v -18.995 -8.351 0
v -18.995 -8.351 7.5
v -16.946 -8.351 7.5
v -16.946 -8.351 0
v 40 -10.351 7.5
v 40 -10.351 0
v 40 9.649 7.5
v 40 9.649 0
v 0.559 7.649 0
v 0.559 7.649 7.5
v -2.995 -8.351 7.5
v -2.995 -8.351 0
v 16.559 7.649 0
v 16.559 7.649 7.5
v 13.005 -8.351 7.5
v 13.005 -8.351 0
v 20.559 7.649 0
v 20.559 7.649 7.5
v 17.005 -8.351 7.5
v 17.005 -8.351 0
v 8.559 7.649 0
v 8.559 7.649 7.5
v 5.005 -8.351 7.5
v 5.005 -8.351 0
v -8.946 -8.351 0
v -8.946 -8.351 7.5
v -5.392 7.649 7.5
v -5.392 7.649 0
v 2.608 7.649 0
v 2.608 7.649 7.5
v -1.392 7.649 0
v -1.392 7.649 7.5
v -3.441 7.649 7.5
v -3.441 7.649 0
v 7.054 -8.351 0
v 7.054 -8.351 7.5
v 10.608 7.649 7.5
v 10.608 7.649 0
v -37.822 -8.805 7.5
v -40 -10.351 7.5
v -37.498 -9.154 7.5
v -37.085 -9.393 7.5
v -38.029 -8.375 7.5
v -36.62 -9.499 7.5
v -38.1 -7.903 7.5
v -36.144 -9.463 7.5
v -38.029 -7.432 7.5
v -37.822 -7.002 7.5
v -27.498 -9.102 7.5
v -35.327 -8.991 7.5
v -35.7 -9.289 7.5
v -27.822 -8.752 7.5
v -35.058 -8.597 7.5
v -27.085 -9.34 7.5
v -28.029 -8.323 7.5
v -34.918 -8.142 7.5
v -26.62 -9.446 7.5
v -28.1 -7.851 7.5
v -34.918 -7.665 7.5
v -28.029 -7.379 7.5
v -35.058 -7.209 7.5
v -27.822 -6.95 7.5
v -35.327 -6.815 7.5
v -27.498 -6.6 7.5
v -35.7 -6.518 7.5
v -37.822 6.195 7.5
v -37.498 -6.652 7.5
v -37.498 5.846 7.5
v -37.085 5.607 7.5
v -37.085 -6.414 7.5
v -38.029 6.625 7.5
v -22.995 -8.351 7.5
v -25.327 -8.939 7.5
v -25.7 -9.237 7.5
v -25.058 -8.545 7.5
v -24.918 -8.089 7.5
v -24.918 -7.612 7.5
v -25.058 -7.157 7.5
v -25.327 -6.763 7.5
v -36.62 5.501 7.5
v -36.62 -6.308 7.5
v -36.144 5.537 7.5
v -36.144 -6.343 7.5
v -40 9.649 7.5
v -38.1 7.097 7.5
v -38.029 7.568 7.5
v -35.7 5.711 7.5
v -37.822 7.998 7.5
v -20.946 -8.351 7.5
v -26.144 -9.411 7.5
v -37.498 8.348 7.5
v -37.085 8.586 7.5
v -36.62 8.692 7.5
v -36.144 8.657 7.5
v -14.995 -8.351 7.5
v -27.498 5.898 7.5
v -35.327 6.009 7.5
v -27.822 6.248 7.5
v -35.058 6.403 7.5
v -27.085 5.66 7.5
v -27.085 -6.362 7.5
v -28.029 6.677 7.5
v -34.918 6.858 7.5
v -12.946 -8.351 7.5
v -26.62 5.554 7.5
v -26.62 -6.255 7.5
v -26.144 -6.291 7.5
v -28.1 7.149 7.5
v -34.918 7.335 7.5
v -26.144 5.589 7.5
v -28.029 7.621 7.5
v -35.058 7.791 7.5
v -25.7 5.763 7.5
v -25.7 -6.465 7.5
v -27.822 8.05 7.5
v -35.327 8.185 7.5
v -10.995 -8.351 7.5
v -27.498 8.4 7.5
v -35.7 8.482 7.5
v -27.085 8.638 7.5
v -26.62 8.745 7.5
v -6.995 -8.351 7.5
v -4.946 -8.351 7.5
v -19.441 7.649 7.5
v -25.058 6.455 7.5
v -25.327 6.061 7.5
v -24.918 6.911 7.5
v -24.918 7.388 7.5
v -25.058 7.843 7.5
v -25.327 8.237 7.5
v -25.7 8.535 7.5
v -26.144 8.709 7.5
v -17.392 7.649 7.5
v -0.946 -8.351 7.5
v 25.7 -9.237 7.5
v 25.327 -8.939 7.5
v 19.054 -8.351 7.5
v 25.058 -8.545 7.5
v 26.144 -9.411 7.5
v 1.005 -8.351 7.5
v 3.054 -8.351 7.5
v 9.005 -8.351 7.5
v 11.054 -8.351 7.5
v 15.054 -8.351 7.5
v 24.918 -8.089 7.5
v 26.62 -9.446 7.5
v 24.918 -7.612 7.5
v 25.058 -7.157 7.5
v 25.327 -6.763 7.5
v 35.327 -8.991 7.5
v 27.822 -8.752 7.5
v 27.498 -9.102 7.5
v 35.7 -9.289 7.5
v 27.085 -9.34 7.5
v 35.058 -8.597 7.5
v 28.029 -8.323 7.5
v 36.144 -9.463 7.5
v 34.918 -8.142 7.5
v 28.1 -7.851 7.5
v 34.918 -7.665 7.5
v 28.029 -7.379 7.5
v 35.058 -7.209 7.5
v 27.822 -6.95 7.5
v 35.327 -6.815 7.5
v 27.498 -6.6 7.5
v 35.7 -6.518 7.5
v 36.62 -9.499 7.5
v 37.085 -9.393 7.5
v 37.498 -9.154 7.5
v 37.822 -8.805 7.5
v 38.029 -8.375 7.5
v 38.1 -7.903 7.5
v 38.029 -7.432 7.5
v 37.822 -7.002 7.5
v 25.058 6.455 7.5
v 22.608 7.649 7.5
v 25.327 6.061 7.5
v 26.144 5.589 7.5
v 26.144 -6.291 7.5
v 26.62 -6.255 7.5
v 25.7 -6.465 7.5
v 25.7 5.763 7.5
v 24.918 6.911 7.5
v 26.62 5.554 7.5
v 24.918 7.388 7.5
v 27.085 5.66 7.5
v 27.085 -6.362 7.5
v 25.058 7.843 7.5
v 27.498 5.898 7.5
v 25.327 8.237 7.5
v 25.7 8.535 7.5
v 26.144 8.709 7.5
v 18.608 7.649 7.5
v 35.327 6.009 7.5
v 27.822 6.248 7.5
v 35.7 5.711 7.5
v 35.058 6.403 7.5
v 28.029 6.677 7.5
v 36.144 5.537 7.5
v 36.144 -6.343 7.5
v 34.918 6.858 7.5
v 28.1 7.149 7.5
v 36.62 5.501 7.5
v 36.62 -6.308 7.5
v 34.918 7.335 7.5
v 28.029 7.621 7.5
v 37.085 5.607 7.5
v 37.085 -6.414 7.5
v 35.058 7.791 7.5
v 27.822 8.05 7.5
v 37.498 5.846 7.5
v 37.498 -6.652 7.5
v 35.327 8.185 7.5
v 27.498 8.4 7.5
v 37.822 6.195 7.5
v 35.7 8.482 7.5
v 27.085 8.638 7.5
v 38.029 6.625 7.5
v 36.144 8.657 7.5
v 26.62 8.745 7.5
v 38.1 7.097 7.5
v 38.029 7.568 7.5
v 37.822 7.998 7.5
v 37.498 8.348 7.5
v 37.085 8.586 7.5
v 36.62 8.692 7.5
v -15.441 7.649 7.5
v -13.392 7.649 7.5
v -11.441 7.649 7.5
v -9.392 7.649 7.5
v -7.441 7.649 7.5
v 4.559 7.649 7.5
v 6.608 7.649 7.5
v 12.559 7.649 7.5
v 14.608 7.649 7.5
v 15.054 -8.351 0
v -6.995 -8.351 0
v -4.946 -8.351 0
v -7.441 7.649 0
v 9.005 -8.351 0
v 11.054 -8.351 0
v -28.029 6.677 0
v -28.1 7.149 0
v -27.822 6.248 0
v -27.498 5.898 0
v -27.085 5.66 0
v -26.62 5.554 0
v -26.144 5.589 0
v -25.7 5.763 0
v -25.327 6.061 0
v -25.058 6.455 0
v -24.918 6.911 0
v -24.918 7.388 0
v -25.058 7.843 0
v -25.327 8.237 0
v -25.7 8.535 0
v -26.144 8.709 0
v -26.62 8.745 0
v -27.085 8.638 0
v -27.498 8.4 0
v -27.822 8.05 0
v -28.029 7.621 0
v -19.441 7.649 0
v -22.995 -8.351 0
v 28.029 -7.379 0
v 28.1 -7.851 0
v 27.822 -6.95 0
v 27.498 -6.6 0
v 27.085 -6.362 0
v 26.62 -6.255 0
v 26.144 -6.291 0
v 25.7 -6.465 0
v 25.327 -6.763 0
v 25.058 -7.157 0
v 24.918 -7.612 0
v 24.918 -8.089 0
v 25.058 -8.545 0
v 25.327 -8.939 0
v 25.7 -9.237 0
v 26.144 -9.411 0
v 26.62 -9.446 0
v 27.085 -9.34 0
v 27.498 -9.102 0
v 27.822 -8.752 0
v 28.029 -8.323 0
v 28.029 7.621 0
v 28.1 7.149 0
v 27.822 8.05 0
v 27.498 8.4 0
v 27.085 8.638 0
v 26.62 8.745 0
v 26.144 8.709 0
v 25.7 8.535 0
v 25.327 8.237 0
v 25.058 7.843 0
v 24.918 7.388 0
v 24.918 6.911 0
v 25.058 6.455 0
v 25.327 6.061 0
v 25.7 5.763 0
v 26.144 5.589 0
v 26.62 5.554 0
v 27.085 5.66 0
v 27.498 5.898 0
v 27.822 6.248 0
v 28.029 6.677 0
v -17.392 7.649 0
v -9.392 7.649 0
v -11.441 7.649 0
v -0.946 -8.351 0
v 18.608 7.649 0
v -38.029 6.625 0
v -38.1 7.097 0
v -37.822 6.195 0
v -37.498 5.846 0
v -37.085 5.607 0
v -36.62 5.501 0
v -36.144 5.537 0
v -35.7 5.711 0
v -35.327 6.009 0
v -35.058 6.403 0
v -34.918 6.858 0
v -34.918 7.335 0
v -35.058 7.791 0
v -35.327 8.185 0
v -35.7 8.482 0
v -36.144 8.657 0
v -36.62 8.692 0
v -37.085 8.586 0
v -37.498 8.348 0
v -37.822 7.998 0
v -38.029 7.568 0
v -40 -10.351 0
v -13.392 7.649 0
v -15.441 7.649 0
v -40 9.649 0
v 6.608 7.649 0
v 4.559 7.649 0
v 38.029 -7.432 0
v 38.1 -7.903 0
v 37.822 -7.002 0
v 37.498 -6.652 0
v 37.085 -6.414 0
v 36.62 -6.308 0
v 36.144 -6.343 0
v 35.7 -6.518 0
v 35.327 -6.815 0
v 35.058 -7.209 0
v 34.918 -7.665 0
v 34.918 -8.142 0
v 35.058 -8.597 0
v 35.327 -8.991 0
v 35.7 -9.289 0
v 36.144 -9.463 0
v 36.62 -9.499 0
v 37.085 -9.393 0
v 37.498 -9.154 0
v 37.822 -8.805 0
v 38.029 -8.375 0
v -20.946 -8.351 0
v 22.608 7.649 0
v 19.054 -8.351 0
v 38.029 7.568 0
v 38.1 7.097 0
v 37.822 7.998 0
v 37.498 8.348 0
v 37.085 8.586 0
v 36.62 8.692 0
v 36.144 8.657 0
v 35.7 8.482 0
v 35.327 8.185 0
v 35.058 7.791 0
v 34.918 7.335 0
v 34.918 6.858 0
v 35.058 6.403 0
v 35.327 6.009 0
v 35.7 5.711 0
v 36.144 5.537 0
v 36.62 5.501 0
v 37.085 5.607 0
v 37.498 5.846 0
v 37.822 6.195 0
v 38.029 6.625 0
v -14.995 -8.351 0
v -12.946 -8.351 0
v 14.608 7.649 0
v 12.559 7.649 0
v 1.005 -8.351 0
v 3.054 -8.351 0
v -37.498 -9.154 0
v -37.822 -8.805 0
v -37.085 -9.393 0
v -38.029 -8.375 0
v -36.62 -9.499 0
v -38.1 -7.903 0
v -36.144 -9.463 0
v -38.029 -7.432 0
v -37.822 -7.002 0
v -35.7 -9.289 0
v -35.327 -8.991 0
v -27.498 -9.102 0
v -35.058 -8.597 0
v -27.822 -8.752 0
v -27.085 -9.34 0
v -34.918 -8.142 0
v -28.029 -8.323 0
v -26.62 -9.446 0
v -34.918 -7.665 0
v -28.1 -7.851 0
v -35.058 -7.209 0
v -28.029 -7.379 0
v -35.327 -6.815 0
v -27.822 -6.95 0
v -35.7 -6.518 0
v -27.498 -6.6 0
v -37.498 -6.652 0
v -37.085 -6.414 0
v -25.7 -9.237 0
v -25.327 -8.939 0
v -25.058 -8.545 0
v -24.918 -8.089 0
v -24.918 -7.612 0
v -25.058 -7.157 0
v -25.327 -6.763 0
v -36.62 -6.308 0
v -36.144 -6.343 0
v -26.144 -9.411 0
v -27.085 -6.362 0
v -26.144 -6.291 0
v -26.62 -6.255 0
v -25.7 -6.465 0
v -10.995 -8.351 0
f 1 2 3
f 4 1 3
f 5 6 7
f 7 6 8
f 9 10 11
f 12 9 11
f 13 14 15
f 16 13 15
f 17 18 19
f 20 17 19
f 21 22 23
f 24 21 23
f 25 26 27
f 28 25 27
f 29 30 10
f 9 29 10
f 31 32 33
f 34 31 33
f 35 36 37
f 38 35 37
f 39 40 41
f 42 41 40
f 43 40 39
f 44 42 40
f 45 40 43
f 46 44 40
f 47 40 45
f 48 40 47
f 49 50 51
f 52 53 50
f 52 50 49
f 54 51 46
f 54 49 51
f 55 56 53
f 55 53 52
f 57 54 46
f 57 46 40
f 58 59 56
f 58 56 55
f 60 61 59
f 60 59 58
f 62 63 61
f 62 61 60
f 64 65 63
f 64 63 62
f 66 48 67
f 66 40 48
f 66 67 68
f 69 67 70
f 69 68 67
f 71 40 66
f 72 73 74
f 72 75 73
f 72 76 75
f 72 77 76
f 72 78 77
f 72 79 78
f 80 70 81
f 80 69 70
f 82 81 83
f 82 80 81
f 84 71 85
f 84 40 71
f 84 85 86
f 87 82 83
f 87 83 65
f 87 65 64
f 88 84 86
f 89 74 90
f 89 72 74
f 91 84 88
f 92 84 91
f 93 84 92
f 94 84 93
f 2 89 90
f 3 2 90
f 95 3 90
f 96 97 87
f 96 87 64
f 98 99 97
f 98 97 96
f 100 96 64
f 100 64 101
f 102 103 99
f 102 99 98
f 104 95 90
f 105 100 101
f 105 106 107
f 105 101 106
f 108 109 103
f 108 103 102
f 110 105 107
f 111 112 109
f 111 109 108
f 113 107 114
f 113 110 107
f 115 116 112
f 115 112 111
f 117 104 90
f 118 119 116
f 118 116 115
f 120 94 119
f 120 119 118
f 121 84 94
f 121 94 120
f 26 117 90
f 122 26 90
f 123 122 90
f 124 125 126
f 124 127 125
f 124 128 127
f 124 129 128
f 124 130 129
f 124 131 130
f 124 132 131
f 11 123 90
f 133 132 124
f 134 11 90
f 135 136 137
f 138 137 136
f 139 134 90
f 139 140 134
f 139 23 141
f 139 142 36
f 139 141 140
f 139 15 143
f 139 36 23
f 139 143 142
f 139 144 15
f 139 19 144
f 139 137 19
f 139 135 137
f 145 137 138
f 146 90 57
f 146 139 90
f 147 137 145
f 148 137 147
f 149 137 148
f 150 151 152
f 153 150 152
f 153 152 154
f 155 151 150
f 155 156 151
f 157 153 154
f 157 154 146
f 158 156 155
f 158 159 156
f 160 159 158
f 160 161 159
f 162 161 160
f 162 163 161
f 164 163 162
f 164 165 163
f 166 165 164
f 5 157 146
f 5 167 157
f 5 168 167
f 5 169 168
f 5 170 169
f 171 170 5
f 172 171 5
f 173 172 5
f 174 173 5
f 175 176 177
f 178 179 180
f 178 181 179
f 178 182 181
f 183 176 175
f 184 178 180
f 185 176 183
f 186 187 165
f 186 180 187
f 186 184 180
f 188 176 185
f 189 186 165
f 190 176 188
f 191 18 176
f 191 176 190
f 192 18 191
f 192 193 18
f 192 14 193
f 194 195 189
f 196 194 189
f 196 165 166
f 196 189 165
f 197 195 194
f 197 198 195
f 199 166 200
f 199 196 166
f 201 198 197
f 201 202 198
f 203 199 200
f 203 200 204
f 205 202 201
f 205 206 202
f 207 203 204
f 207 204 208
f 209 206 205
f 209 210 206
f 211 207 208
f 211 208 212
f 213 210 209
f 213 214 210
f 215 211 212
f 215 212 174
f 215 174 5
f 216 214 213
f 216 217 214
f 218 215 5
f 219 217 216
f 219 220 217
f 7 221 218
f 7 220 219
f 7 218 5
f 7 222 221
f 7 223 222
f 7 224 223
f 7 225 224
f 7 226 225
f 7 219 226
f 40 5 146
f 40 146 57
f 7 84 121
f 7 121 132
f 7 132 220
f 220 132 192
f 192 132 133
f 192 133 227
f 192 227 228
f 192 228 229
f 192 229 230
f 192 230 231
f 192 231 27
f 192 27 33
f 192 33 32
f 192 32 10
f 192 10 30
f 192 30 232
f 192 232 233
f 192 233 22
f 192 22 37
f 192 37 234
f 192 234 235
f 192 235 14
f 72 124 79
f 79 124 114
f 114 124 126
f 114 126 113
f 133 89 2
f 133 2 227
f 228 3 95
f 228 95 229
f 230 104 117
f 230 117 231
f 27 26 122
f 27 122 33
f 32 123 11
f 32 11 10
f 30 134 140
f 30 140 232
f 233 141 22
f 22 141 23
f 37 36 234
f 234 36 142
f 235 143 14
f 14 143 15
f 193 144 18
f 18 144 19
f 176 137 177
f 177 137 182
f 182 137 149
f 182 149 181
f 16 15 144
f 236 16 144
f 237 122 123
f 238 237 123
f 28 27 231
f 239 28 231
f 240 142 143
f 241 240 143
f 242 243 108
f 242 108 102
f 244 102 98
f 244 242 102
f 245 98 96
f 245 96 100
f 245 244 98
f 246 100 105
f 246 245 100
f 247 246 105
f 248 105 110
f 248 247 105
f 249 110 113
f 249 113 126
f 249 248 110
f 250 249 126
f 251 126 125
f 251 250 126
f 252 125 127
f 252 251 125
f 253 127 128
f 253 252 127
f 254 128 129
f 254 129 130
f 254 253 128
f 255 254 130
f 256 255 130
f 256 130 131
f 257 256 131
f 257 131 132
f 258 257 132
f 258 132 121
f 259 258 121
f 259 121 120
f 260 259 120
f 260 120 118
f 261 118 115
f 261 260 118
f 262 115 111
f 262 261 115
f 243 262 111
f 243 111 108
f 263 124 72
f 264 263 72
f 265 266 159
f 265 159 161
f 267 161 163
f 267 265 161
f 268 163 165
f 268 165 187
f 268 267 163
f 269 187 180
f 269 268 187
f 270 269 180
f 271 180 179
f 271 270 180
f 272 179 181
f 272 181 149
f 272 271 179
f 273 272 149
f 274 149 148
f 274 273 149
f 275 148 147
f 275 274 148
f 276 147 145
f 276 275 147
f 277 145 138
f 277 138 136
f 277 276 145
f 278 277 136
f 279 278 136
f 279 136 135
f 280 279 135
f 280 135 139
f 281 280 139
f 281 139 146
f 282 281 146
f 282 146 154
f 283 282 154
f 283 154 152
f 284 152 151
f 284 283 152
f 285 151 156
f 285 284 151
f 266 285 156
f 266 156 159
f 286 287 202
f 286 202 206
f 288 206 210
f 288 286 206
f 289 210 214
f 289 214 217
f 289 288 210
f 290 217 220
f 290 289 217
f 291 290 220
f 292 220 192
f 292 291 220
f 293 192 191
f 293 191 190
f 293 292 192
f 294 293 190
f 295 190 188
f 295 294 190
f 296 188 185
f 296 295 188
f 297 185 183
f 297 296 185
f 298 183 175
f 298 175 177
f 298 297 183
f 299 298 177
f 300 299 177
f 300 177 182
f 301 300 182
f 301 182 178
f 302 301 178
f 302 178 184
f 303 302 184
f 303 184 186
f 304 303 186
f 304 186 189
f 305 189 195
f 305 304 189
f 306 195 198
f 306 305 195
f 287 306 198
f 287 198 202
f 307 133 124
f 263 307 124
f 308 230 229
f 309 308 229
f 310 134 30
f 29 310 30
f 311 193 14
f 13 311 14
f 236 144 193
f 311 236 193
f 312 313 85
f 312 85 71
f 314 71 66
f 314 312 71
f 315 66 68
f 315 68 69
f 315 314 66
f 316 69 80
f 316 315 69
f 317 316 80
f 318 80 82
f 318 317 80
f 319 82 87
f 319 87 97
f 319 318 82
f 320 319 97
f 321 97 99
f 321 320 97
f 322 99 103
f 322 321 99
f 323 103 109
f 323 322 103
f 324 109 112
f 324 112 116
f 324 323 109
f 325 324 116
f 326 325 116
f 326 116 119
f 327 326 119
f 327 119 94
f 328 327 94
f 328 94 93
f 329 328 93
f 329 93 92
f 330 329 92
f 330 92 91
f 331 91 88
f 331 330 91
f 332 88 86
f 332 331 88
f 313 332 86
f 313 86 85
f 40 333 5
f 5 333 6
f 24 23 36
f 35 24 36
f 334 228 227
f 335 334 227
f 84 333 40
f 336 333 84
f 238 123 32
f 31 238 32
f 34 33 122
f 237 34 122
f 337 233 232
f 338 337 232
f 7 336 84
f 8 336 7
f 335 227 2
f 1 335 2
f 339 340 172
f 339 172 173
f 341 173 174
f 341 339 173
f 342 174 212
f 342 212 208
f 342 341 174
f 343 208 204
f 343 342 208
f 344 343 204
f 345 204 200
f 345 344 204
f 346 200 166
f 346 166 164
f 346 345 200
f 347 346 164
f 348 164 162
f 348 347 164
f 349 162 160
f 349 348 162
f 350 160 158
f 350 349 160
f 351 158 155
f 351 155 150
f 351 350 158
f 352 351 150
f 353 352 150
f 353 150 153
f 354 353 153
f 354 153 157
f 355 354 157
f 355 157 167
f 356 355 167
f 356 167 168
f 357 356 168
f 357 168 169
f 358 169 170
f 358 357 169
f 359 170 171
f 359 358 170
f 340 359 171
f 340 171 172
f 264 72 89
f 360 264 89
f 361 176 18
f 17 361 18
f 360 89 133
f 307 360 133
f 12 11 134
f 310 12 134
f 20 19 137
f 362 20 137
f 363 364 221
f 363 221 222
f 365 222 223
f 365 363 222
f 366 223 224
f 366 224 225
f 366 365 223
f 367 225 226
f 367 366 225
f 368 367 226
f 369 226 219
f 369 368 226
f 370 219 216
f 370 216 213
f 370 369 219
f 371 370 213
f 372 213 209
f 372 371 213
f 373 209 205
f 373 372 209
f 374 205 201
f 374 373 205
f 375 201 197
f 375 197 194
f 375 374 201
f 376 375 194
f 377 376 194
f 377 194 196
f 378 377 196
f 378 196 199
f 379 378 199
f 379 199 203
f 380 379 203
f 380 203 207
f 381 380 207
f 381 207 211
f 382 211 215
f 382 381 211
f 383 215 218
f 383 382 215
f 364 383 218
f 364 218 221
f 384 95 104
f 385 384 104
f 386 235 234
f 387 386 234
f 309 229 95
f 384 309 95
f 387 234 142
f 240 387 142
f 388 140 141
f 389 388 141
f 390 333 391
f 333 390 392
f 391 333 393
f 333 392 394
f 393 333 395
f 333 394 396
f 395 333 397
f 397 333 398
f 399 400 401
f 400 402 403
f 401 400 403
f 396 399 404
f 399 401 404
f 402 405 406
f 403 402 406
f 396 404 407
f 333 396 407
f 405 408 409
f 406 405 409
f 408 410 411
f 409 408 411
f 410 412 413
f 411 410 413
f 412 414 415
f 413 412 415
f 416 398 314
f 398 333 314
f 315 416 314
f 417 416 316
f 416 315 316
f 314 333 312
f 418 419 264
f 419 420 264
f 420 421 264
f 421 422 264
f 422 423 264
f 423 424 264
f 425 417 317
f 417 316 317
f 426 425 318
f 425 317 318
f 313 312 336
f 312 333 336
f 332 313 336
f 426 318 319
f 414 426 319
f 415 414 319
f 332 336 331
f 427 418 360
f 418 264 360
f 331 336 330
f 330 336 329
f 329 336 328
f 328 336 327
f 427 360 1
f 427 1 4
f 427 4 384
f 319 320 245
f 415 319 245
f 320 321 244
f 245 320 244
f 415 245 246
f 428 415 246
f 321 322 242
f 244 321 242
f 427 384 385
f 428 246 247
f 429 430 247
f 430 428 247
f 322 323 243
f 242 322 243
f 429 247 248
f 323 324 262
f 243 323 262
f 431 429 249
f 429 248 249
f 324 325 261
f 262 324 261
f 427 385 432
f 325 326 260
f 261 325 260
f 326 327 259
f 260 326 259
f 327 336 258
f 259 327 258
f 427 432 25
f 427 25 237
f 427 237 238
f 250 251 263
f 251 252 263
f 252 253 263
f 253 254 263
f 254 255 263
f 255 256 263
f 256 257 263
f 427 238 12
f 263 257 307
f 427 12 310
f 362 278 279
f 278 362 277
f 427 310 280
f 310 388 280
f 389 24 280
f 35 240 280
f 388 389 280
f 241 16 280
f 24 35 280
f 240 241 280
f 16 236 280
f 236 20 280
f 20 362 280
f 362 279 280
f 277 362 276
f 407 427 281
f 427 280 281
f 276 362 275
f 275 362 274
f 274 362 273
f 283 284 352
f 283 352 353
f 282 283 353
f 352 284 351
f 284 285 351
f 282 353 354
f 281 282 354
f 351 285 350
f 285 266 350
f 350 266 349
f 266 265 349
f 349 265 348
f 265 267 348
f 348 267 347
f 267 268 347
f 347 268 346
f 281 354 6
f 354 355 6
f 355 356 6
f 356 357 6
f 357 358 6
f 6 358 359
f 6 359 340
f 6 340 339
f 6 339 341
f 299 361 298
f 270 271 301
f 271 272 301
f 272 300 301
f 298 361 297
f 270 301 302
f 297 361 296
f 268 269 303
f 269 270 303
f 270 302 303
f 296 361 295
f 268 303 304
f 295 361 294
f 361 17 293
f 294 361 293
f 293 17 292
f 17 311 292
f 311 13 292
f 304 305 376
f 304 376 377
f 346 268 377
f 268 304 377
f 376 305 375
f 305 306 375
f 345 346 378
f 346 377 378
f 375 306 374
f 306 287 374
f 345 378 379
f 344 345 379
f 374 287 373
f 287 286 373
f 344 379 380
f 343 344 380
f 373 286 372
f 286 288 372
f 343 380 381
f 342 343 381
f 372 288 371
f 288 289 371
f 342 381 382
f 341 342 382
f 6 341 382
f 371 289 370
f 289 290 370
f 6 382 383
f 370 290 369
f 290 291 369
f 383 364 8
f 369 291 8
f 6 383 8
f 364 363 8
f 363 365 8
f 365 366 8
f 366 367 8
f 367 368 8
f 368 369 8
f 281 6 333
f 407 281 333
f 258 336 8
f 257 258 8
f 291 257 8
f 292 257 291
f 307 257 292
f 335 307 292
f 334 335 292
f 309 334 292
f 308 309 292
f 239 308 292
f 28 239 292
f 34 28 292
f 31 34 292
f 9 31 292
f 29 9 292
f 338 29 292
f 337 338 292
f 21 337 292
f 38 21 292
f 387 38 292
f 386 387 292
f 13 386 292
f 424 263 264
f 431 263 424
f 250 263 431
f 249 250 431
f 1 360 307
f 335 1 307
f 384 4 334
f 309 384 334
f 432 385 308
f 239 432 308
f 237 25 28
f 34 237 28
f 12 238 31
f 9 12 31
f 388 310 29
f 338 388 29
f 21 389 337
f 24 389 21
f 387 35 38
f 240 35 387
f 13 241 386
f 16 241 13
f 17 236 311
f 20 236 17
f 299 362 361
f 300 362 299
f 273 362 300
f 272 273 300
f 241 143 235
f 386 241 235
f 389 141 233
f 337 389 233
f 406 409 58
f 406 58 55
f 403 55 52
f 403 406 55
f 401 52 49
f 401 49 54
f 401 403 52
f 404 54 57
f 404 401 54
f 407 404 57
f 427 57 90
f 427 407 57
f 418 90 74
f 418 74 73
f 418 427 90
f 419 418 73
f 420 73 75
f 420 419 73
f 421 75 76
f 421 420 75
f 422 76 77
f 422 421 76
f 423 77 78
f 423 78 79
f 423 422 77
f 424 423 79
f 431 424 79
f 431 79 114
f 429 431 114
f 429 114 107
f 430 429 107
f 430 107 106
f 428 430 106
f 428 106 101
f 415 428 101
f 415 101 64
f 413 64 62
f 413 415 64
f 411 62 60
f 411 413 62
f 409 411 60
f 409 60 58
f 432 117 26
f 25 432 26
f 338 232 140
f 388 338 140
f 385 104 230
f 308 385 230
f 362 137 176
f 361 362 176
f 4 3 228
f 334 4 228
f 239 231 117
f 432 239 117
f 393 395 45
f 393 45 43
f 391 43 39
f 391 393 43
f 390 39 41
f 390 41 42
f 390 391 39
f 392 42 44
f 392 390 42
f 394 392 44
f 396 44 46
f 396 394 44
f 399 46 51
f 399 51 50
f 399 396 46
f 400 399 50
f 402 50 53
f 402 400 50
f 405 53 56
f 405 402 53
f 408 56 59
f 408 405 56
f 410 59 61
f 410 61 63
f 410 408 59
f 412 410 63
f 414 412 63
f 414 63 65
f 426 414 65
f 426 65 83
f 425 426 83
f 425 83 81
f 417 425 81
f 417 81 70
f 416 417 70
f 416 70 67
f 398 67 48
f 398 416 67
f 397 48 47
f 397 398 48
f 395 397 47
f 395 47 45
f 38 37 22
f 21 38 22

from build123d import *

# Parameters (mm, degrees)
SKETCH1_W           = 80
SKETCH1_H           = 20
SKETCH1_R           = 1.6
BOSS_EXTRUDE4_DEPTH = 7.5
CUT_EXTRUDE1_DEPTH  = 7.5


with BuildPart() as part:
    # Sketch1 → Boss-Extrude4 (new body)
    with BuildSketch(Plane.XY):
        with Locations((0, -0.350941688)):
            Rectangle(SKETCH1_W, SKETCH1_H)
        with Locations((36.5, 7.096795016)):
            Circle(SKETCH1_R, mode=Mode.SUBTRACT)
        with Locations((26.5, 7.149058312)):
            Circle(SKETCH1_R, mode=Mode.SUBTRACT)
        with Locations((36.5, -7.903204984)):
            Circle(SKETCH1_R, mode=Mode.SUBTRACT)
        with Locations((26.5, -7.850941688)):
            Circle(SKETCH1_R, mode=Mode.SUBTRACT)
        with Locations(Location((-26.5, -7.850941688, 0), (0, 0, 180))):  # turned: the seam where the file's is
            Circle(SKETCH1_R, mode=Mode.SUBTRACT)
        with Locations(Location((-36.5, -7.903204984, 0), (0, 0, 180))):  # turned: the seam where the file's is
            Circle(SKETCH1_R, mode=Mode.SUBTRACT)
        with Locations(Location((-26.5, 7.149058312, 0), (0, 0, 180))):  # turned: the seam where the file's is
            Circle(SKETCH1_R, mode=Mode.SUBTRACT)
        with Locations(Location((-36.5, 7.096795016, 0), (0, 0, 180))):  # turned: the seam where the file's is
            Circle(SKETCH1_R, mode=Mode.SUBTRACT)
    extrude(amount=BOSS_EXTRUDE4_DEPTH)

    # Sketch6 → Cut-Extrude1 (cut)
    with BuildSketch(Plane.XY.offset(7.5)):
        Polygon((-19.441029478, 7.649058312), (-22.994766049, -8.350941688), (-20.946027704, -8.350941688), (-17.392291133, 7.649058312), align=None)
        Polygon((-13.392291133, 7.649058312), (-15.441029478, 7.649058312), (-18.994766049, -8.350941688), (-16.946027704, -8.350941688), align=None)
        Polygon((-9.392291133, 7.649058312), (-11.441029478, 7.649058312), (-14.994766049, -8.350941688), (-12.946027704, -8.350941688), align=None)
        Polygon((-5.392291133, 7.649058312), (-7.441029478, 7.649058312), (-10.994766049, -8.350941688), (-8.946027704, -8.350941688), align=None)
        Polygon((-1.392291133, 7.649058312), (-3.441029478, 7.649058312), (-6.994766049, -8.350941688), (-4.946027704, -8.350941688), align=None)
        Polygon((2.607708867, 7.649058312), (0.558970522, 7.649058312), (-2.994766049, -8.350941688), (-0.946027704, -8.350941688), align=None)
        Polygon((6.607708867, 7.649058312), (4.558970522, 7.649058312), (1.005233951, -8.350941688), (3.053972296, -8.350941688), align=None)
        Polygon((10.607708867, 7.649058312), (8.558970522, 7.649058312), (5.005233951, -8.350941688), (7.053972296, -8.350941688), align=None)
        Polygon((14.607708867, 7.649058312), (12.558970522, 7.649058312), (9.005233951, -8.350941688), (11.053972296, -8.350941688), align=None)
        Polygon((18.607708867, 7.649058312), (16.558970522, 7.649058312), (13.005233951, -8.350941688), (15.053972296, -8.350941688), align=None)
        Polygon((22.607708867, 7.649058312), (20.558970522, 7.649058312), (17.005233951, -8.350941688), (19.053972296, -8.350941688), align=None)
    extrude(amount=-CUT_EXTRUDE1_DEPTH, mode=Mode.SUBTRACT)


solid = part.part
